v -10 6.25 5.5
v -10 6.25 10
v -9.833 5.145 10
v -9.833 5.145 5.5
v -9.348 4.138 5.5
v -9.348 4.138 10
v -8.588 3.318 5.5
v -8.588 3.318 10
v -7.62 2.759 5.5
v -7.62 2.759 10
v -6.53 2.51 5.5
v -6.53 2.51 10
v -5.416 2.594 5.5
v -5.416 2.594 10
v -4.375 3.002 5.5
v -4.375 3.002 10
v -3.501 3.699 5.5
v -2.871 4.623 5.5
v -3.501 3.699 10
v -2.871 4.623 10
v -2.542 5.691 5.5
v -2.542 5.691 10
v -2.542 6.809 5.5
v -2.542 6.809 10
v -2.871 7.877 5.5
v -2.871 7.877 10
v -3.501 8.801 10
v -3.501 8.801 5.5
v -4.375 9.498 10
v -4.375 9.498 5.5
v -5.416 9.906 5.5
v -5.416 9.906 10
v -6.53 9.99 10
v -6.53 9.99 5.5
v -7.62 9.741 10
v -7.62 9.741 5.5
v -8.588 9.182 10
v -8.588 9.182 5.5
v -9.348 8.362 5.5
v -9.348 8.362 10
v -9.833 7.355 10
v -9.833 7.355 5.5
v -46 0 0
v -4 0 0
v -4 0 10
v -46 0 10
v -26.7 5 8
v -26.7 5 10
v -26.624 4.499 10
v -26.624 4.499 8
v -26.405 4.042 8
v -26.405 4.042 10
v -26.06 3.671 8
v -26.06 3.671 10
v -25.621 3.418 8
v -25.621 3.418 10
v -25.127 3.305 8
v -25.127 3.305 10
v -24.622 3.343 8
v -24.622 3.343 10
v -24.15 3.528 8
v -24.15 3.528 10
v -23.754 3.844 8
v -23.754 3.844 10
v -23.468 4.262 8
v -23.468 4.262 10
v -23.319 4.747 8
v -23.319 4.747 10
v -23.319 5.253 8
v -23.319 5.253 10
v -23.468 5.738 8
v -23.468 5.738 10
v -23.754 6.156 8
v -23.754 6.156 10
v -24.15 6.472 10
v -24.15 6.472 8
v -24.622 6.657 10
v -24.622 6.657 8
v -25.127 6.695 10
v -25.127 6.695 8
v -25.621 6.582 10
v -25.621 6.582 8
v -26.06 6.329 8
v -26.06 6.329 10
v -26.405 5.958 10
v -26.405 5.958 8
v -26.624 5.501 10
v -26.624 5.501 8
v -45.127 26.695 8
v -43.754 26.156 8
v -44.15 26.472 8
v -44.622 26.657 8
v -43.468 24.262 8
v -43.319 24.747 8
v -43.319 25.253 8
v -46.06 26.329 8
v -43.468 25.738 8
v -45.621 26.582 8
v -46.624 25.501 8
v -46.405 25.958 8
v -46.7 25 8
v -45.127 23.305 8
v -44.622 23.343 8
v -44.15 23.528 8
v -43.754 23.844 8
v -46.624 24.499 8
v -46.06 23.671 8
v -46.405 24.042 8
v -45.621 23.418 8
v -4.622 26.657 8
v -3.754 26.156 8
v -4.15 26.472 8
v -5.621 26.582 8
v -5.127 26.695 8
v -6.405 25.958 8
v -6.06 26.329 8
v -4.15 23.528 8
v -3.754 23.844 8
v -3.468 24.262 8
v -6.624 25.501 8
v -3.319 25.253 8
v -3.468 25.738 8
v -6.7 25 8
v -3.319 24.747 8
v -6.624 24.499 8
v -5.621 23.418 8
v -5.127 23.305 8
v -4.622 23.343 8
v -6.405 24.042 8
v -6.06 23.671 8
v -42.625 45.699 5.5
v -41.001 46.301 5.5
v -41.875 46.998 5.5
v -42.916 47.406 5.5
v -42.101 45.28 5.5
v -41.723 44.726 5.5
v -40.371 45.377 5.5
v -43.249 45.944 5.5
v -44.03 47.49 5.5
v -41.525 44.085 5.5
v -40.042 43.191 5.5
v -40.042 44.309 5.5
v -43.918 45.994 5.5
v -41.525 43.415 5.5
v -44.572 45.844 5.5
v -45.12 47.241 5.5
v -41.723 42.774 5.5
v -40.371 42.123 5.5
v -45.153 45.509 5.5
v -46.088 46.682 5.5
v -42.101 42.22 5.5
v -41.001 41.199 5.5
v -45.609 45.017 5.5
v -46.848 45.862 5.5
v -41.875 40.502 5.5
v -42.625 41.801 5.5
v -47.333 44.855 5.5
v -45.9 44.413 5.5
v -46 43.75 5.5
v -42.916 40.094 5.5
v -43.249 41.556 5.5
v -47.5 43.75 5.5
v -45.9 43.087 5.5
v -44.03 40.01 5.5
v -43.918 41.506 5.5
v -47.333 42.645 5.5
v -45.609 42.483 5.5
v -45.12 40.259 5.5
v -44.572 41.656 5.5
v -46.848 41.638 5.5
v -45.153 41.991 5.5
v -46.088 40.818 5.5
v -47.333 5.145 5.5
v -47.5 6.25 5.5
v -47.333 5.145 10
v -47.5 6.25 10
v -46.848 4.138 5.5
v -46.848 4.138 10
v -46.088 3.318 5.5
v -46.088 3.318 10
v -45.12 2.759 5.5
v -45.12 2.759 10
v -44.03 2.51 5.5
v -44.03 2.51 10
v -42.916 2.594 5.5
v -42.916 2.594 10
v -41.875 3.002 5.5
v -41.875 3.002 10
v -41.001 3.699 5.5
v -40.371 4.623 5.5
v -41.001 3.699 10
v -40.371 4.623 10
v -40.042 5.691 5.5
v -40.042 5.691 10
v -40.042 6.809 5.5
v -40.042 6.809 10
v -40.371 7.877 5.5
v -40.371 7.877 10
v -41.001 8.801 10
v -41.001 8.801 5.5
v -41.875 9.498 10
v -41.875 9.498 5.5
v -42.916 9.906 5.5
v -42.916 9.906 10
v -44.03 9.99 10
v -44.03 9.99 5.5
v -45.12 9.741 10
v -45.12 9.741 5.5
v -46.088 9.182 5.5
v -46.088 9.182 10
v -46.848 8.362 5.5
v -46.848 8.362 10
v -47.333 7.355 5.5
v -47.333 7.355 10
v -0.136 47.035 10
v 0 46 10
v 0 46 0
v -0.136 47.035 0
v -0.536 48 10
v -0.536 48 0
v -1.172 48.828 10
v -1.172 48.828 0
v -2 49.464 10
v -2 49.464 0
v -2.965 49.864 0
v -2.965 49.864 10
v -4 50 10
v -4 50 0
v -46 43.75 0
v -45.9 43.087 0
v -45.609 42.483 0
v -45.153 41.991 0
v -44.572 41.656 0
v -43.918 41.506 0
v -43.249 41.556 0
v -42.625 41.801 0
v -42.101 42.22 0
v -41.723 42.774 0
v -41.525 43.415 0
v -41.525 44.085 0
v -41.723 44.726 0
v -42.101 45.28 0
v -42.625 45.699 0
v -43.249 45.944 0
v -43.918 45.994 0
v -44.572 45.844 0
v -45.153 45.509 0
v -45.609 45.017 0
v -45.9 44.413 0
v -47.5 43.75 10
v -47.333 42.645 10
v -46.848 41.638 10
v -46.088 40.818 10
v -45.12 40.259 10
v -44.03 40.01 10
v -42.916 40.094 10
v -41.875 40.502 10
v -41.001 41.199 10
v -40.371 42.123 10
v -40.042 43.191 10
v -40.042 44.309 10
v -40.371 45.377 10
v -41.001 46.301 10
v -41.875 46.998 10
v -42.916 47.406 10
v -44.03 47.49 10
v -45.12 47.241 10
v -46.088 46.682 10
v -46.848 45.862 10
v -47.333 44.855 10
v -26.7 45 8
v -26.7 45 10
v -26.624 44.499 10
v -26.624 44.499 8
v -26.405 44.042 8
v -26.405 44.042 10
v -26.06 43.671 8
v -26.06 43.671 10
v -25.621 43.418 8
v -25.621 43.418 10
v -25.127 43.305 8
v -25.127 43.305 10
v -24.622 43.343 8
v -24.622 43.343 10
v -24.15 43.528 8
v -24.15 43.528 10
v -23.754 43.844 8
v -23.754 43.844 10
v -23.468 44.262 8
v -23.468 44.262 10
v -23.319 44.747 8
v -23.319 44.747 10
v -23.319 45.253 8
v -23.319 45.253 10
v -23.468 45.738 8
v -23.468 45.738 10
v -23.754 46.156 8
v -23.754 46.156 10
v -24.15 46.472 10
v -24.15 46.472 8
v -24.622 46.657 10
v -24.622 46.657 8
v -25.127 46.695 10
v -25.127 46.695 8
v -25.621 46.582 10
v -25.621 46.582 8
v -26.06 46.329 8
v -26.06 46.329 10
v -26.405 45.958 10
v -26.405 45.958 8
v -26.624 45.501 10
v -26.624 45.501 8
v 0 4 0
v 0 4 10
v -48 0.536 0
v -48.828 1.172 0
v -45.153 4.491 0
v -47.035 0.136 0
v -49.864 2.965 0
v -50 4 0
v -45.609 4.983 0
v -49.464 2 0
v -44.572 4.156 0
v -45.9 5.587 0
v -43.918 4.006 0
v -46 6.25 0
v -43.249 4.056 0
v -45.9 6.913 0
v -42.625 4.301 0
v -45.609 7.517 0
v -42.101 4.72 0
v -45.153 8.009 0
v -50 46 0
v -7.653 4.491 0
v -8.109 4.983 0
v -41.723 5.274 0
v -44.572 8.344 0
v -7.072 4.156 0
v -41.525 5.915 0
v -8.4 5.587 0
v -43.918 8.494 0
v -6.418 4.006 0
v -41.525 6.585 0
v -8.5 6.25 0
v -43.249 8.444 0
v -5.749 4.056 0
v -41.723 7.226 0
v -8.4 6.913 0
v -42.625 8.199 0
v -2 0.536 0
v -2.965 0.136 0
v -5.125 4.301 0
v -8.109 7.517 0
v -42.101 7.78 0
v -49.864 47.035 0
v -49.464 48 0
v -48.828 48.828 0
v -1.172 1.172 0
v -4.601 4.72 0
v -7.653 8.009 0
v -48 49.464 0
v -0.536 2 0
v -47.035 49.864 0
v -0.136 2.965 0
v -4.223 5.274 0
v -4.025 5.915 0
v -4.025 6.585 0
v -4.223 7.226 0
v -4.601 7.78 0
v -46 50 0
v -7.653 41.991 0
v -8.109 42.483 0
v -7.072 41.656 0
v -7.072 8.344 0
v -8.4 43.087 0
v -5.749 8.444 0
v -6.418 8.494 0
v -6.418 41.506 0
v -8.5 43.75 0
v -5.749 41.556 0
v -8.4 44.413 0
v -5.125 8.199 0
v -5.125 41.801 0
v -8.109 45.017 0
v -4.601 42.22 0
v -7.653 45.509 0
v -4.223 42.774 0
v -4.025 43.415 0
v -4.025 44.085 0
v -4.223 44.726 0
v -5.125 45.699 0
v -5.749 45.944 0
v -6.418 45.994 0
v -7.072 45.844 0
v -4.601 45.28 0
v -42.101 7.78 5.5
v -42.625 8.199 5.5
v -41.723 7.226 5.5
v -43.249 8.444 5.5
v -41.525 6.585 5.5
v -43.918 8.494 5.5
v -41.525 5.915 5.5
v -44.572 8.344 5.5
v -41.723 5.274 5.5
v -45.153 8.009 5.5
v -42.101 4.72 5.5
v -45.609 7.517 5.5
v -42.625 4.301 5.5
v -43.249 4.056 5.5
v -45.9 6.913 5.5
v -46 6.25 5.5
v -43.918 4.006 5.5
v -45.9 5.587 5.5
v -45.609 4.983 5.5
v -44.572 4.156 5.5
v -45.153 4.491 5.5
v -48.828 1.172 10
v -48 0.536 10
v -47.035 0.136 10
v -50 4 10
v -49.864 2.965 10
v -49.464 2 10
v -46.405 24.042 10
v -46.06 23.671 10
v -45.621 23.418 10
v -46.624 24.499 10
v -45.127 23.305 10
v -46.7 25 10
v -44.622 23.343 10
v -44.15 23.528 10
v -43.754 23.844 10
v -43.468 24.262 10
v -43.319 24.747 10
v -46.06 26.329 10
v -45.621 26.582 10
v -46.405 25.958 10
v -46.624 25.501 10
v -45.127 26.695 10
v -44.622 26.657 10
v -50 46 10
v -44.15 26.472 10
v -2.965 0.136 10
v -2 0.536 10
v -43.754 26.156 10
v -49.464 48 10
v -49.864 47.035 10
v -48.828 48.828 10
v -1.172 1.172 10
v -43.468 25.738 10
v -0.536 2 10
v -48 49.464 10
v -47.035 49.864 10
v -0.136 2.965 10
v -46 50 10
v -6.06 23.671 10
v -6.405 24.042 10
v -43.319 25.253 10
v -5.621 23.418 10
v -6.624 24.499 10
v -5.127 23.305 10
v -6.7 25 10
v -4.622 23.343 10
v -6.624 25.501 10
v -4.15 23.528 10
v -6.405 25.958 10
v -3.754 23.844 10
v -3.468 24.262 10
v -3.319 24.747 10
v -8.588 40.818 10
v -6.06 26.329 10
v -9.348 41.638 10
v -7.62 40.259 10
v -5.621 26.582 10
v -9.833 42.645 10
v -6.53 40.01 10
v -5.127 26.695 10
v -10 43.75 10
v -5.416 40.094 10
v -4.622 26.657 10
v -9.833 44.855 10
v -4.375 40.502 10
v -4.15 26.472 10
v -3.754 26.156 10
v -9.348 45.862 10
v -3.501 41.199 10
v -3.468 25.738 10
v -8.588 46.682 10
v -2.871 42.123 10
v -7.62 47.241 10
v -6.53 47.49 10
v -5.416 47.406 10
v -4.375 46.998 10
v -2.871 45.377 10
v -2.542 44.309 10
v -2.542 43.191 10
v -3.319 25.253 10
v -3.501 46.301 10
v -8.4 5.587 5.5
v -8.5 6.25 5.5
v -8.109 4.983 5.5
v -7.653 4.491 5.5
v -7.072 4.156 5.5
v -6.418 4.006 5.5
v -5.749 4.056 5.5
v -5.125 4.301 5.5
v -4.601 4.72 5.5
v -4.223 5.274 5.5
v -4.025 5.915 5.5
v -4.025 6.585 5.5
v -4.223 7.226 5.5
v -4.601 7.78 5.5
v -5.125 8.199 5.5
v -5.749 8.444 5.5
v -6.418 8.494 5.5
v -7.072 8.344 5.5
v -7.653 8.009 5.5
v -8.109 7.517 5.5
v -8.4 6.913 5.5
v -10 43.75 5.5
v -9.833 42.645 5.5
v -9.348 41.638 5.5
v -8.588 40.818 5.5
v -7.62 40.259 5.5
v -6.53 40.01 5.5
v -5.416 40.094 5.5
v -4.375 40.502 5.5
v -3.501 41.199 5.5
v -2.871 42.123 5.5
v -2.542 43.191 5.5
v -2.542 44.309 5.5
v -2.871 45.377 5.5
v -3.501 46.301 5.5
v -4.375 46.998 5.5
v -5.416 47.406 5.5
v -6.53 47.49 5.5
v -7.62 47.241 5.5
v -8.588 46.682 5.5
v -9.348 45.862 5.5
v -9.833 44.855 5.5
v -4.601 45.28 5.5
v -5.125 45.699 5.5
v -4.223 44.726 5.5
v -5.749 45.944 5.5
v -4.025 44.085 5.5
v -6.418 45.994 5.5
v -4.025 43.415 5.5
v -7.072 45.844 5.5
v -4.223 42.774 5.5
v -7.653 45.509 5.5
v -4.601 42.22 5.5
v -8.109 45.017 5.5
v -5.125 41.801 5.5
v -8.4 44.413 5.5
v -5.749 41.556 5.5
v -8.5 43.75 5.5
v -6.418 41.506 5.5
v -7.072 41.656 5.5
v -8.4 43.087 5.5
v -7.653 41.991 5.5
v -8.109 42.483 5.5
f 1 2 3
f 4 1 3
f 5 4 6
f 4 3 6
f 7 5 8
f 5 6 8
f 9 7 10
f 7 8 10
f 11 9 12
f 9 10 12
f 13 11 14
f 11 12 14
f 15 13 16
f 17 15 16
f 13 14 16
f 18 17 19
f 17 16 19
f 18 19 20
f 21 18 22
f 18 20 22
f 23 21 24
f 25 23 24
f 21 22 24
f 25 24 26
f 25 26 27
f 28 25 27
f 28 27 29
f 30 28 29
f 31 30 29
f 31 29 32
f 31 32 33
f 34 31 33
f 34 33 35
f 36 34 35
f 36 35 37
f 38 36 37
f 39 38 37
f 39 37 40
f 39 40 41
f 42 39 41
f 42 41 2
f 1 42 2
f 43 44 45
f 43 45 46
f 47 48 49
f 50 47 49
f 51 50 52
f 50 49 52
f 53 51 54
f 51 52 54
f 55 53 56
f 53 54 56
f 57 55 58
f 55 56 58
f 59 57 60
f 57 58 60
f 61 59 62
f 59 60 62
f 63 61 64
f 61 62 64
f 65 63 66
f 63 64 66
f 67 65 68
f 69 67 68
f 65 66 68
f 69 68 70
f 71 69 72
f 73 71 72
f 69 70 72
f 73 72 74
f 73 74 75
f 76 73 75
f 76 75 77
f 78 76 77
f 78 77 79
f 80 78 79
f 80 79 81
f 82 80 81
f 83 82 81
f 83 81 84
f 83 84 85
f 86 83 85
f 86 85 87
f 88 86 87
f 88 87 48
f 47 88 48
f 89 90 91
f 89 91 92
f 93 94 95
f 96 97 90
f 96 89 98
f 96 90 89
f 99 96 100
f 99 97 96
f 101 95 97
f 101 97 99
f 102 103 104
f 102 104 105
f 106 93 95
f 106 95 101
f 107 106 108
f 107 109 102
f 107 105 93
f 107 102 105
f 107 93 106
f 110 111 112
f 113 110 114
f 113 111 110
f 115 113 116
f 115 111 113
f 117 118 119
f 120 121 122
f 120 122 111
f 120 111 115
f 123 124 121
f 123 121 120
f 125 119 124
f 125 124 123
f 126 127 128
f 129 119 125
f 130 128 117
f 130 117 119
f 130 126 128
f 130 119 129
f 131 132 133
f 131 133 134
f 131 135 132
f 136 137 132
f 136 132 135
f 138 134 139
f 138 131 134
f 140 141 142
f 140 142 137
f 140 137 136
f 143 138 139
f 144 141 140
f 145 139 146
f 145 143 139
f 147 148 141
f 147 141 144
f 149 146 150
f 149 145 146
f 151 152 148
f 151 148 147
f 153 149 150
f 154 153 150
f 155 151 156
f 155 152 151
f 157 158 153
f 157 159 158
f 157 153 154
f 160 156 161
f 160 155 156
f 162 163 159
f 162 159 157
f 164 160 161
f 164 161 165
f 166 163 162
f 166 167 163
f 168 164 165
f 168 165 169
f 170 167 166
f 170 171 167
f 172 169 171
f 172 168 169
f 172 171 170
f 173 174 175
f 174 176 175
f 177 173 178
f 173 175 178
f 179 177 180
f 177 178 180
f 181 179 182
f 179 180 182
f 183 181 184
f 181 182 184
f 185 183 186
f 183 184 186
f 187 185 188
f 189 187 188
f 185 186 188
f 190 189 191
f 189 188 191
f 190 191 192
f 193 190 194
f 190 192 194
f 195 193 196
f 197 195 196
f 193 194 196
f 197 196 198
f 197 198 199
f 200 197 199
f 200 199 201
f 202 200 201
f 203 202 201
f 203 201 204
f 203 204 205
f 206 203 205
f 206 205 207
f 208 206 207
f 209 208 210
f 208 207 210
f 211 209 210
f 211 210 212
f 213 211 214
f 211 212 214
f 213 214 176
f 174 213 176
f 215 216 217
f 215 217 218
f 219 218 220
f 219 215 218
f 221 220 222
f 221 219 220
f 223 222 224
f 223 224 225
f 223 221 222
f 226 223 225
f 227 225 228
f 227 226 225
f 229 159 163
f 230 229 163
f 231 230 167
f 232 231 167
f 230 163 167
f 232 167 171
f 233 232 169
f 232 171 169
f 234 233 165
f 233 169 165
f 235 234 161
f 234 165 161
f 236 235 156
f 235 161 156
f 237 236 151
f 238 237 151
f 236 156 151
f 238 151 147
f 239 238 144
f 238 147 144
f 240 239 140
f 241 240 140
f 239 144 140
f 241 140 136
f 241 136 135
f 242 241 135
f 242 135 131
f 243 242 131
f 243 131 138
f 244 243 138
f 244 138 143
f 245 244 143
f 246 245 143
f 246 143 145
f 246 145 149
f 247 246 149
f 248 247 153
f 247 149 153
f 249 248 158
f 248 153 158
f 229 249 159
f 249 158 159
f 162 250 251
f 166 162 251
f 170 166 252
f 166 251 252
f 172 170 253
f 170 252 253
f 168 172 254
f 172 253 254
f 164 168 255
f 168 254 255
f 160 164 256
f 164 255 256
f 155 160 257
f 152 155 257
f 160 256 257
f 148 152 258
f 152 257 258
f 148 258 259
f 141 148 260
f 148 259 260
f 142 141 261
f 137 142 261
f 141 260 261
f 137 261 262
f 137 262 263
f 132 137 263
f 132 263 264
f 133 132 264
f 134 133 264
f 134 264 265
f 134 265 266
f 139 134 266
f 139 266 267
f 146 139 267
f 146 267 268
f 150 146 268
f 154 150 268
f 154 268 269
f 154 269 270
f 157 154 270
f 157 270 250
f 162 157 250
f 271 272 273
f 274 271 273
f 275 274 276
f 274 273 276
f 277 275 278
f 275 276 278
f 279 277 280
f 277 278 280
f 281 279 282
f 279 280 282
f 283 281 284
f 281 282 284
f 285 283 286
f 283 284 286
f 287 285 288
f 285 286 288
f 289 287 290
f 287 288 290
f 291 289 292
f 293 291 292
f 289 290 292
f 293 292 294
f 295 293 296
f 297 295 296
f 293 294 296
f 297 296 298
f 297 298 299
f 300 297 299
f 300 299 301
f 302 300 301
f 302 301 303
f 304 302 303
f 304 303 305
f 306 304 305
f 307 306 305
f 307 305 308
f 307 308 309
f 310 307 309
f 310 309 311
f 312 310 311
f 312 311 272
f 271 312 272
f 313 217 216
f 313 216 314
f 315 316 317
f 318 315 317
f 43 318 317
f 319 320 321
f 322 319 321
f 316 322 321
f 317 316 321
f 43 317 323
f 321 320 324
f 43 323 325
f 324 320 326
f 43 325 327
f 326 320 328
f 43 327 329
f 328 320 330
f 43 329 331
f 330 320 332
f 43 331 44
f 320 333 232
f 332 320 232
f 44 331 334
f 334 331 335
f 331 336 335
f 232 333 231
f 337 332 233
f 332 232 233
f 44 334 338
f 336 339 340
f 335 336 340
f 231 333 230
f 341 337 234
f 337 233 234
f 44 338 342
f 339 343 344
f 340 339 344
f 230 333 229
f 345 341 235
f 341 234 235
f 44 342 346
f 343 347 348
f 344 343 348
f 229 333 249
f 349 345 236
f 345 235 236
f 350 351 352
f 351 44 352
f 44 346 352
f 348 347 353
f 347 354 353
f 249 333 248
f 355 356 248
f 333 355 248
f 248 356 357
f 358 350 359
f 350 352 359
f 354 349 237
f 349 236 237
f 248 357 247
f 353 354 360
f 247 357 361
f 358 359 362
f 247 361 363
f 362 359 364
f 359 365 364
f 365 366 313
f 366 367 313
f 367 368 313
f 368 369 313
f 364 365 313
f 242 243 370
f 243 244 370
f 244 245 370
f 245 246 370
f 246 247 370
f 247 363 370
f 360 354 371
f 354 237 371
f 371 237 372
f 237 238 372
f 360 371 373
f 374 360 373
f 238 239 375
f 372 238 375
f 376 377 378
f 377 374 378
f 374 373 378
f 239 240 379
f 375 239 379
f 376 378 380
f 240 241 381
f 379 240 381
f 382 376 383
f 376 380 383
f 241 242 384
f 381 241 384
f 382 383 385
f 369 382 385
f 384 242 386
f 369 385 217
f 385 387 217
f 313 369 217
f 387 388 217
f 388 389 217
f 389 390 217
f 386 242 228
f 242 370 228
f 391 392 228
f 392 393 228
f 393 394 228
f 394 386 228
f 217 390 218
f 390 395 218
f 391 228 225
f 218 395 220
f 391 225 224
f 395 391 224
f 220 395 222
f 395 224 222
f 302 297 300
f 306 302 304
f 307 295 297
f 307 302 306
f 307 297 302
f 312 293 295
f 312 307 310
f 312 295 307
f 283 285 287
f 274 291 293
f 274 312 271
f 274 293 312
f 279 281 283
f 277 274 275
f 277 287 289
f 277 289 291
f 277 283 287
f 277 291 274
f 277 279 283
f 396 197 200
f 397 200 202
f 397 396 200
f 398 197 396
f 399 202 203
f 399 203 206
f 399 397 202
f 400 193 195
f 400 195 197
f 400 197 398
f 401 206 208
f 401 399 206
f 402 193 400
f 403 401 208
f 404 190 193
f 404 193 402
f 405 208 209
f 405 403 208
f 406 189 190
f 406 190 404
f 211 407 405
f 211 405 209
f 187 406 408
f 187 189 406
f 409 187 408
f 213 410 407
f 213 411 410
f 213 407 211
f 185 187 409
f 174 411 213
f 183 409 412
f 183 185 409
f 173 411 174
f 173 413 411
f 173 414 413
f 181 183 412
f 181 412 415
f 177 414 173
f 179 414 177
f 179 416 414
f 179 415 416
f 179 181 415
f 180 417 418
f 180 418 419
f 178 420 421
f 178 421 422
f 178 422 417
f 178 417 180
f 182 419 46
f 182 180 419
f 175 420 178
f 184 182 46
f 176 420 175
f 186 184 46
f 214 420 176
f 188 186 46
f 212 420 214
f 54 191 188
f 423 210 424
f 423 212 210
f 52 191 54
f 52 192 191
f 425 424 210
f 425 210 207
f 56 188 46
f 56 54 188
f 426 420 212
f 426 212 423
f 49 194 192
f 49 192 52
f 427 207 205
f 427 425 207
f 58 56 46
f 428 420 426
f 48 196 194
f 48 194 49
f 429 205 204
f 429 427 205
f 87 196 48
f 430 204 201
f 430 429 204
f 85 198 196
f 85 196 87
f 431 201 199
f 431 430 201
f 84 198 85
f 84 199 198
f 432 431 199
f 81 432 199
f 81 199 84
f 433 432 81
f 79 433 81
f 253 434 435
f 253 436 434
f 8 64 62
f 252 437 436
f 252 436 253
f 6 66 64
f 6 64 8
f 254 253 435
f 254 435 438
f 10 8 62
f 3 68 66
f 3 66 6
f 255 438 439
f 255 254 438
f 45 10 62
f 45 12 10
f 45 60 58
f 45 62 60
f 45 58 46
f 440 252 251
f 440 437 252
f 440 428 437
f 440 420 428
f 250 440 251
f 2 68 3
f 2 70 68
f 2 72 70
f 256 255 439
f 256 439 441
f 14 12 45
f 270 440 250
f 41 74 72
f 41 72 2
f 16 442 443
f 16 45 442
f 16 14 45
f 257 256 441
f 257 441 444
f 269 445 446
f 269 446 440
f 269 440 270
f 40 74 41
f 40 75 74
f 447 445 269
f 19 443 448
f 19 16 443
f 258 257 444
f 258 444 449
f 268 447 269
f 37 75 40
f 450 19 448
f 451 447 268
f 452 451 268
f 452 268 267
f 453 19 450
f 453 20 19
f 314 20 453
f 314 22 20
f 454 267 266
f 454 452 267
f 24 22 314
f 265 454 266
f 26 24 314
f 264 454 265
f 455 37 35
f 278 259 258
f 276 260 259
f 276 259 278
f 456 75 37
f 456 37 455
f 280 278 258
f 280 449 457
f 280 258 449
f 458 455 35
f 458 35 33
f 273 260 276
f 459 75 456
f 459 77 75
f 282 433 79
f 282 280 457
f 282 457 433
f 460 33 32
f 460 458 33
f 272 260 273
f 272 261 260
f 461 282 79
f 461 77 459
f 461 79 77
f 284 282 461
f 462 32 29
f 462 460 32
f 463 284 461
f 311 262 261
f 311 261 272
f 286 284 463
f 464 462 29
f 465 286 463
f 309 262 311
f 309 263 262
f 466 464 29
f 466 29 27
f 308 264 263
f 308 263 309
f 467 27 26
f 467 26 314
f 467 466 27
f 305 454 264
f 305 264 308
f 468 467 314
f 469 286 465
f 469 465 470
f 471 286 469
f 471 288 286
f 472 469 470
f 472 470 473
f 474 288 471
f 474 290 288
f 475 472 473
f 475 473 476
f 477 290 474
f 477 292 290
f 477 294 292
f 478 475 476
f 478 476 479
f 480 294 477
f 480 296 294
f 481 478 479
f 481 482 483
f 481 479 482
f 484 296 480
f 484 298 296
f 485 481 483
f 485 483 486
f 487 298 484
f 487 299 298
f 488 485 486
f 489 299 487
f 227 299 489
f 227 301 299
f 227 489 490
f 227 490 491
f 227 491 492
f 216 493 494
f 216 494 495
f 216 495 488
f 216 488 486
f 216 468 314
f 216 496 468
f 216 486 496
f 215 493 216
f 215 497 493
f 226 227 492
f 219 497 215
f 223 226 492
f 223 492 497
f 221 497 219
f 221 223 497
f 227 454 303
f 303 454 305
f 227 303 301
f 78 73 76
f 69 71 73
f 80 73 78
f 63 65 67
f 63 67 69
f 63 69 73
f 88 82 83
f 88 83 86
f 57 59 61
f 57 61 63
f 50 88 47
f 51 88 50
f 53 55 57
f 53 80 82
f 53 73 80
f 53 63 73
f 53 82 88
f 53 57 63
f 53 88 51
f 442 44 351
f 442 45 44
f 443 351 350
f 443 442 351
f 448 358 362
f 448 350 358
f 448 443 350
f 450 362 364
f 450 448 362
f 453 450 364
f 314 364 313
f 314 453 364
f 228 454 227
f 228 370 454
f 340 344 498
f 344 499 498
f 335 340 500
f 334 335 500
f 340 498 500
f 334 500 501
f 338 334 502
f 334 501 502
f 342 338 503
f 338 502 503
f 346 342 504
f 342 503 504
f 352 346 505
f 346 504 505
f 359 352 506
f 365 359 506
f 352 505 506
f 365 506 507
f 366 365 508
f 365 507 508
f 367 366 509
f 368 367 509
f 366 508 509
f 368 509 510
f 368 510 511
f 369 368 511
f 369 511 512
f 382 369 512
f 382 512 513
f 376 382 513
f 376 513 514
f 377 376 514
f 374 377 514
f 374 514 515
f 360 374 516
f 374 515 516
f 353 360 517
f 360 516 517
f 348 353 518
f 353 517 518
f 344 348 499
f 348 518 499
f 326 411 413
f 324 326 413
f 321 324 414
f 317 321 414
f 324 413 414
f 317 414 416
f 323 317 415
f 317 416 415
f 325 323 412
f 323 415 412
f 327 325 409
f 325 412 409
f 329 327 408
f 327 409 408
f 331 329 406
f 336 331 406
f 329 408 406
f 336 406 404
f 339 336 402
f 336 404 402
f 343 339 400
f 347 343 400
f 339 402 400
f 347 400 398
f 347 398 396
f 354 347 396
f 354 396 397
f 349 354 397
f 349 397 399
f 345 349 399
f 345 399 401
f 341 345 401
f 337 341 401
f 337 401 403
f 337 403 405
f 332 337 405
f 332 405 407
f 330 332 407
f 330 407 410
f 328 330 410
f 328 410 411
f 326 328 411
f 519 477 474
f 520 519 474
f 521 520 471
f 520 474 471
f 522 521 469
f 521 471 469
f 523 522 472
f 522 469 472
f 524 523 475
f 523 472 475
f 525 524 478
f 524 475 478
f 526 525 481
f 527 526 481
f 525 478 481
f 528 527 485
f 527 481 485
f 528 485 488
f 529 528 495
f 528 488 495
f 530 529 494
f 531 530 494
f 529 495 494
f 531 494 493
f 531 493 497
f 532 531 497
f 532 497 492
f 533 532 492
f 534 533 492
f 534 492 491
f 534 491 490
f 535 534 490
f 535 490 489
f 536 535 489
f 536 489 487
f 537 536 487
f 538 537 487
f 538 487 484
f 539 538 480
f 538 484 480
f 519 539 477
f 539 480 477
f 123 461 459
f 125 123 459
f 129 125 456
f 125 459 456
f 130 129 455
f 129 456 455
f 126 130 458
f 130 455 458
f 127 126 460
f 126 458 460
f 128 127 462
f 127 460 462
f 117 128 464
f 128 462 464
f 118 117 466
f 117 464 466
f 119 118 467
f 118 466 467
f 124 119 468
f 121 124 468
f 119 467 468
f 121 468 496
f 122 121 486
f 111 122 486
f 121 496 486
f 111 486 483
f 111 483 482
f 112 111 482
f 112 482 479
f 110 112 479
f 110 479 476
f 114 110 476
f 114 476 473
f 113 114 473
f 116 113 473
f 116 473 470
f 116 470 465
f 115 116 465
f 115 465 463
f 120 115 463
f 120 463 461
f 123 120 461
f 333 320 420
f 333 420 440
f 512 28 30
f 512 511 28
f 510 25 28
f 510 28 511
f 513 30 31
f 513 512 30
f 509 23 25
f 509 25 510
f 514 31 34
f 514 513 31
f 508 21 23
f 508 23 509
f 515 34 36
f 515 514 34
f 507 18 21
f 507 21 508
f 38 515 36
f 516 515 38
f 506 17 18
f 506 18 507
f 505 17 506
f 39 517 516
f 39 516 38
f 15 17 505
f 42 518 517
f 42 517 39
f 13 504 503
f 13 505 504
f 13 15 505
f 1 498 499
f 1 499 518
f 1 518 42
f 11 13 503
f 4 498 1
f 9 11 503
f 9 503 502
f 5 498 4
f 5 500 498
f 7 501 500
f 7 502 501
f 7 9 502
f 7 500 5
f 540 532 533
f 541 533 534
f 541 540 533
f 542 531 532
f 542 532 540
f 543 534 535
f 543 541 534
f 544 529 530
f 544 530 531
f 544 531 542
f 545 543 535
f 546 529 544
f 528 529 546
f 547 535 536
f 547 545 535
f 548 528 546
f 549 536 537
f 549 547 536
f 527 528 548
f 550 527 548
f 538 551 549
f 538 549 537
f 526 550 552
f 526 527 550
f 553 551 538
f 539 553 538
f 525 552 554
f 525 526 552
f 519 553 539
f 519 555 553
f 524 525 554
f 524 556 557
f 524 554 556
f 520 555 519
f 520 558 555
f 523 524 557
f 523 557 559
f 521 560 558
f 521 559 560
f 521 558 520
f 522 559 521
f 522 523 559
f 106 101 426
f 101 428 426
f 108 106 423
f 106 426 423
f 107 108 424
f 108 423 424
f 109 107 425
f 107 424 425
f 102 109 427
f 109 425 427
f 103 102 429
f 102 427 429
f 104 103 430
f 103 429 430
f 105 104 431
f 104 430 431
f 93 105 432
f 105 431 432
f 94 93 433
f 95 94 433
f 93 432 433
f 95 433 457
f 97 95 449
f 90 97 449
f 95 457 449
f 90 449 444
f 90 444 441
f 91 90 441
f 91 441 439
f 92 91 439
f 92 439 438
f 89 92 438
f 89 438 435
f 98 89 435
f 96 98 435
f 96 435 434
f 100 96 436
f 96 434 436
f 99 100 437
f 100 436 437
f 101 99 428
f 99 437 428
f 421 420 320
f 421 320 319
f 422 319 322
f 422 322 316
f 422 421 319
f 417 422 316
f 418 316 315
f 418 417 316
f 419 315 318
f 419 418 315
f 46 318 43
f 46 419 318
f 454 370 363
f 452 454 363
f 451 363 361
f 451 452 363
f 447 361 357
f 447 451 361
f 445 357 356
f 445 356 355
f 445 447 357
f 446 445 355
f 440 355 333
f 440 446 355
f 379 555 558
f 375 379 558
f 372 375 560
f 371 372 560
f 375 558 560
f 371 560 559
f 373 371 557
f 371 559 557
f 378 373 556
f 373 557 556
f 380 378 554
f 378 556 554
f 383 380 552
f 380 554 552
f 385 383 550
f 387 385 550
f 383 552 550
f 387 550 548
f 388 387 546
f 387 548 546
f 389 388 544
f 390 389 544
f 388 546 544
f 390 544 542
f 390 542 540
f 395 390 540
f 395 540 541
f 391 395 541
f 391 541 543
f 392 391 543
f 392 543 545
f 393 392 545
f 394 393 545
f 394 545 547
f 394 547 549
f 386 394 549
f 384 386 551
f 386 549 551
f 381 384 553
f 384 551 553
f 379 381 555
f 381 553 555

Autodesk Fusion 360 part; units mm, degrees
sketch "Sketch1" plane through (0, 0, 0) normal (0, 0, 1) x (1, 0, 0)
  line L0 (0, 0) -> (-50, 0)
  line L1 (-50, 0) -> (-50, 50)
  line L2 (-50, 50) -> (0, 50)
  line L3 (0, 50) -> (0, 0)
  dimension "d1" = 50
  dimension "d2" = 50
extrude "Extrude1" add sketch "Sketch1" along normal blind 10
sketch "Sketch2" plane through (0, 0, 10) normal (0, 0, 1) x (-1, 0, 0)
  line L0 (0, -50) -> (50, -50)
  line L1 (50, -50) -> (50, 0)
  line L2 (50, 0) -> (0, 0)
  line L3 (0, 0) -> (0, -50)
  line L4 (50, 0) -> (43.75, 0)
  line L5 (43.75, 0) -> (43.75, -6.25)
  line L6 (43.75, -6.25) -> (50, -6.25)
  line L7 (50, -6.25) -> (50, 0)
  line L8 (50, -50) -> (43.75, -50)
  line L9 (43.75, -50) -> (43.75, -43.75)
  line L10 (43.75, -43.75) -> (50, -43.75)
  line L11 (50, -43.75) -> (50, -50)
  line L12 (0, -50) -> (6.25, -50)
  line L13 (6.25, -50) -> (6.25, -43.75)
  line L14 (6.25, -43.75) -> (0, -43.75)
  line L15 (0, -43.75) -> (0, -50)
  line L16 (0, 0) -> (6.25, 0)
  line L17 (6.25, 0) -> (6.25, -6.25)
  line L18 (6.25, -6.25) -> (0, -6.25)
  line L19 (0, -6.25) -> (0, 0)
  circle A0 centre (43.75, -43.75) radius 3.75
  circle A1 centre (6.25, -43.75) radius 3.75
  circle A2 centre (43.75, -6.25) radius 3.75
  circle A3 centre (6.25, -6.25) radius 3.75
  dimension "d5" = 6.25
  dimension "d6" = 6.25
  dimension "d7" = 6.25
  dimension "d8" = 6.25
  dimension "d9" = 6.25
  dimension "d10" = 6.25
  dimension "d11" = 6.25
  dimension "d12" = 6.25
  dimension "d13" = 7.5
  dimension "d14" = 7.5
  dimension "d15" = 7.5
  dimension "d16" = 7.5
extrude "Extrude2" cut sketch "Sketch2" against normal blind 4.5 contours L13 L14 A1 | L13 L14 A1 | L9 L10 A0 | L9 L10 A0 | L17 L18 A3 | L17 L18 A3 | L5 L6 A2 | L5 L6 A2
sketch "Sketch3" plane through (0, 0, 5.5) normal (0, 0, 1) x (-1, 0, 0)
  circle A0 centre (43.75, -43.75) radius 3.75
  circle A1 centre (43.75, -43.75) radius 2.25
  dimension "d19" = 4.5
extrude "Extrude3" cut sketch "Sketch3" against normal blind 10 contours A1
sketch "Sketch4" plane through (0, 0, 5.5) normal (0, 0, 1) x (-1, 0, 0)
  circle A0 centre (6.25, -43.75) radius 3.75
  circle A1 centre (6.25, -43.75) radius 2.25
  dimension "d22" = 4.5
extrude "Extrude4" cut sketch "Sketch4" against normal blind 10 contours A1
sketch "Sketch5" plane through (0, 0, 5.5) normal (0, 0, 1) x (-1, 0, 0)
  circle A0 centre (43.75, -6.25) radius 3.75
  circle A1 centre (43.75, -6.25) radius 2.25
  dimension "d25" = 4.5
extrude "Extrude5" cut sketch "Sketch5" against normal blind 10 contours A1
sketch "Sketch6" plane through (0, 0, 5.5) normal (0, 0, 1) x (-1, 0, 0)
  circle A0 centre (6.25, -6.25) radius 3.75
  circle A1 centre (6.25, -6.25) radius 2.25
  dimension "d28" = 4.5
extrude "Extrude6" cut sketch "Sketch6" against normal blind 10 contours A1
sketch "Sketch7" plane through (0, 0, 10) normal (0, 0, 1) x (-1, 0, 0)
  circle A0 centre (6.25, -43.75) radius 3.75
  circle A1 centre (6.25, -6.25) radius 3.75
  circle A2 centre (43.75, -43.75) radius 3.75
  circle A3 centre (43.75, -6.25) radius 3.75
  line L0 (0, -50) -> (50, -50)
  line L1 (50, -50) -> (50, 0)
  line L2 (50, 0) -> (0, 0)
  line L3 (0, 0) -> (0, -50)
  line L4 (50, 0) -> (37.5, 0)
  line L5 (37.5, 0) -> (37.5, -12.5)
  line L6 (37.5, -12.5) -> (50, -12.5)
  line L7 (50, -12.5) -> (50, 0)
  line L8 (50, -50) -> (37.5, -50)
  line L9 (37.5, -50) -> (37.5, -37.5)
  line L10 (37.5, -37.5) -> (50, -37.5)
  line L11 (50, -37.5) -> (50, -50)
  line L12 (0, -50) -> (12.5, -50)
  line L13 (12.5, -50) -> (12.5, -37.5)
  line L14 (12.5, -37.5) -> (0, -37.5)
  line L15 (0, -37.5) -> (0, -50)
  line L16 (0, 0) -> (12.5, 0)
  line L17 (12.5, 0) -> (12.5, -12.5)
  line L18 (12.5, -12.5) -> (0, -12.5)
  line L19 (0, -12.5) -> (0, 0)
  line L20 (37.5, -12.5) -> (35.5, -12.5)
  line L21 (35.5, -12.5) -> (35.5, -14.5)
  line L22 (35.5, -14.5) -> (37.5, -14.5)
  line L23 (37.5, -14.5) -> (37.5, -12.5)
  line L24 (37.5, -37.5) -> (35.5, -37.5)
  line L25 (35.5, -37.5) -> (35.5, -35.5)
  line L26 (35.5, -35.5) -> (37.5, -35.5)
  line L27 (37.5, -35.5) -> (37.5, -37.5)
  line L28 (12.5, -37.5) -> (14.5, -37.5)
  line L29 (14.5, -37.5) -> (14.5, -35.5)
  line L30 (14.5, -35.5) -> (12.5, -35.5)
  line L31 (12.5, -35.5) -> (12.5, -37.5)
  line L32 (12.5, -12.5) -> (14.5, -12.5)
  line L33 (14.5, -12.5) -> (14.5, -14.5)
  line L34 (14.5, -14.5) -> (12.5, -14.5)
  line L35 (12.5, -14.5) -> (12.5, -12.5)
  dimension "d31" = 12.5
  dimension "d32" = 12.5
  dimension "d33" = 12.5
  dimension "d34" = 12.5
  dimension "d35" = 12.5
  dimension "d36" = 12.5
  dimension "d37" = 12.5
  dimension "d38" = 12.5
  dimension "d39" = 2
  dimension "d40" = 2
  dimension "d41" = 2
  dimension "d42" = 2
  dimension "d43" = 2
  dimension "d44" = 2
  dimension "d45" = 2
  dimension "d46" = 2
extrude "Extrude7" add sketch "Sketch7" along normal blind 2 contours L24 L25 L26 L27 | L20 L21 L22 L23 | L32 L33 L34 L35 | L28 L29 L30 L31
extrude "Extrude8" cut 4 faces at (-13.1667, 36.1667, 12) (-13.1667, 13.1667, 12) (-36.1667, 13.1667, 12) (-36.8333, 36.8333, 12) along direction (0, 0, -1) blind 2
fillet "Fillet1" radius 4 1 edges at (0, 50, 5)
fillet "Fillet2" radius 4 1 edges at (0, 0, 5)
fillet "Fillet3" radius 4 1 edges at (-50, 50, 5)
fillet "Fillet4" radius 4 1 edges at (-50, 0, 5)
sketch "Sketch8" plane through (0, 0, 10) normal (0, 0, 1) x (-1, 0, 0)
  circle A0 centre (6.25, -43.75) radius 3.75
  circle A1 centre (6.25, -6.25) radius 3.75
  circle A2 centre (43.75, -43.75) radius 3.75
  circle A3 centre (43.75, -6.25) radius 3.75
  arc A4 (50, -4) -> (46, 0) centre (46, -4) ccw
  line L0 (46, 0) -> (4, 0)
  arc A5 (4, 0) -> (0, -4) centre (4, -4) ccw
  line L1 (0, -4) -> (0, -46)
  arc A6 (0, -46) -> (4, -50) centre (4, -46) ccw
  line L2 (4, -50) -> (46, -50)
  arc A7 (46, -50) -> (50, -46) centre (46, -46) ccw
  line L3 (50, -46) -> (50, -4)
  line L4 (0, 0) -> (5, 0)
  line L5 (5, 0) -> (5, -5)
  line L6 (5, -5) -> (0, -5)
  line L7 (0, -5) -> (0, 0)
  line L8 (5, -5) -> (45, -5)
  line L9 (45, -5) -> (45, -45)
  line L10 (45, -45) -> (5, -45)
  line L11 (5, -45) -> (5, -5)
  circle A8 centre (25, -45) radius 1.6
  circle A9 centre (45, -25) radius 1.6
  circle A10 centre (25, -5) radius 1.6
  circle A11 centre (5, -25) radius 1.6
  dimension "d59" = 5
  dimension "d60" = 5
  dimension "d61" = 40
  dimension "d62" = 40
  dimension "d63" = 3.2
  dimension "d64" = 3.2
  dimension "d65" = 3.2
  dimension "d66" = 3.2
extrude "Extrude9" cut sketch "Sketch8" against normal blind 2 contours L11 A11 | L11 A11 | L10 A8 | L10 A8 | L9 A9 | L9 A9 | L8 A10 | L8 A10
sketch "Sketch9" plane through (0, 0, 10) normal (0, 0, 1) x (-1, 0, 0)
  circle A0 centre (25, -45) radius 1.6
  circle A1 centre (5, -25) radius 1.6
  circle A2 centre (45, -25) radius 1.6
  circle A3 centre (25, -5) radius 1.6
  circle A4 centre (6.25, -43.75) radius 3.75
  circle A5 centre (6.25, -6.25) radius 3.75
  circle A6 centre (43.75, -43.75) radius 3.75
  circle A7 centre (43.75, -6.25) radius 3.75
  arc A8 (50, -4) -> (46, 0) centre (46, -4) ccw
  line L0 (46, 0) -> (4, 0)
  arc A9 (4, 0) -> (0, -4) centre (4, -4) ccw
  line L1 (0, -4) -> (0, -46)
  arc A10 (0, -46) -> (4, -50) centre (4, -46) ccw
  line L2 (4, -50) -> (46, -50)
  arc A11 (46, -50) -> (50, -46) centre (46, -46) ccw
  line L3 (50, -46) -> (50, -4)
  circle A12 centre (25, -5) radius 1.7
  dimension "d69" = 3.4
extrude "Extrude10" cut sketch "Sketch9" against normal blind 2 contours A12
sketch "Sketch10" plane through (0, 0, 10) normal (0, 0, 1) x (-1, 0, 0)
  circle A0 centre (25, -5) radius 1.7
  circle A1 centre (25, -45) radius 1.6
  circle A2 centre (5, -25) radius 1.6
  circle A3 centre (45, -25) radius 1.6
  circle A4 centre (6.25, -43.75) radius 3.75
  circle A5 centre (6.25, -6.25) radius 3.75
  circle A6 centre (43.75, -43.75) radius 3.75
  circle A7 centre (43.75, -6.25) radius 3.75
  arc A8 (50, -4) -> (46, 0) centre (46, -4) ccw
  line L0 (46, 0) -> (4, 0)
  arc A9 (4, 0) -> (0, -4) centre (4, -4) ccw
  line L1 (0, -4) -> (0, -46)
  arc A10 (0, -46) -> (4, -50) centre (4, -46) ccw
  line L2 (4, -50) -> (46, -50)
  arc A11 (46, -50) -> (50, -46) centre (46, -46) ccw
  line L3 (50, -46) -> (50, -4)
  circle A12 centre (45, -25) radius 1.7
  dimension "d72" = 3.4
extrude "Extrude11" cut sketch "Sketch10" against normal blind 2 contours A12
sketch "Sketch11" plane through (0, 0, 10) normal (0, 0, 1) x (-1, 0, 0)
  circle A0 centre (45, -25) radius 1.7
  circle A1 centre (25, -5) radius 1.7
  circle A2 centre (25, -45) radius 1.6
  circle A3 centre (5, -25) radius 1.6
  circle A4 centre (6.25, -43.75) radius 3.75
  circle A5 centre (6.25, -6.25) radius 3.75
  circle A6 centre (43.75, -43.75) radius 3.75
  circle A7 centre (43.75, -6.25) radius 3.75
  arc A8 (50, -4) -> (46, 0) centre (46, -4) ccw
  line L0 (46, 0) -> (4, 0)
  arc A9 (4, 0) -> (0, -4) centre (4, -4) ccw
  line L1 (0, -4) -> (0, -46)
  arc A10 (0, -46) -> (4, -50) centre (4, -46) ccw
  line L2 (4, -50) -> (46, -50)
  arc A11 (46, -50) -> (50, -46) centre (46, -46) ccw
  line L3 (50, -46) -> (50, -4)
  circle A12 centre (5, -25) radius 1.7
  dimension "d75" = 3.4
extrude "Extrude12" cut sketch "Sketch11" against normal blind 2 contours A12
sketch "Sketch12" plane through (0, 0, 10) normal (0, 0, 1) x (-1, 0, 0)
  circle A0 centre (5, -25) radius 1.7
  circle A1 centre (45, -25) radius 1.7
  circle A2 centre (25, -5) radius 1.7
  circle A3 centre (25, -45) radius 1.6
  circle A4 centre (6.25, -43.75) radius 3.75
  circle A5 centre (6.25, -6.25) radius 3.75
  circle A6 centre (43.75, -43.75) radius 3.75
  circle A7 centre (43.75, -6.25) radius 3.75
  arc A8 (50, -4) -> (46, 0) centre (46, -4) ccw
  line L0 (46, 0) -> (4, 0)
  arc A9 (4, 0) -> (0, -4) centre (4, -4) ccw
  line L1 (0, -4) -> (0, -46)
  arc A10 (0, -46) -> (4, -50) centre (4, -46) ccw
  line L2 (4, -50) -> (46, -50)
  arc A11 (46, -50) -> (50, -46) centre (46, -46) ccw
  line L3 (50, -46) -> (50, -4)
  circle A12 centre (25, -45) radius 1.7
  dimension "d78" = 3.4
extrude "Extrude13" cut sketch "Sketch12" against normal blind 2 contours A12
